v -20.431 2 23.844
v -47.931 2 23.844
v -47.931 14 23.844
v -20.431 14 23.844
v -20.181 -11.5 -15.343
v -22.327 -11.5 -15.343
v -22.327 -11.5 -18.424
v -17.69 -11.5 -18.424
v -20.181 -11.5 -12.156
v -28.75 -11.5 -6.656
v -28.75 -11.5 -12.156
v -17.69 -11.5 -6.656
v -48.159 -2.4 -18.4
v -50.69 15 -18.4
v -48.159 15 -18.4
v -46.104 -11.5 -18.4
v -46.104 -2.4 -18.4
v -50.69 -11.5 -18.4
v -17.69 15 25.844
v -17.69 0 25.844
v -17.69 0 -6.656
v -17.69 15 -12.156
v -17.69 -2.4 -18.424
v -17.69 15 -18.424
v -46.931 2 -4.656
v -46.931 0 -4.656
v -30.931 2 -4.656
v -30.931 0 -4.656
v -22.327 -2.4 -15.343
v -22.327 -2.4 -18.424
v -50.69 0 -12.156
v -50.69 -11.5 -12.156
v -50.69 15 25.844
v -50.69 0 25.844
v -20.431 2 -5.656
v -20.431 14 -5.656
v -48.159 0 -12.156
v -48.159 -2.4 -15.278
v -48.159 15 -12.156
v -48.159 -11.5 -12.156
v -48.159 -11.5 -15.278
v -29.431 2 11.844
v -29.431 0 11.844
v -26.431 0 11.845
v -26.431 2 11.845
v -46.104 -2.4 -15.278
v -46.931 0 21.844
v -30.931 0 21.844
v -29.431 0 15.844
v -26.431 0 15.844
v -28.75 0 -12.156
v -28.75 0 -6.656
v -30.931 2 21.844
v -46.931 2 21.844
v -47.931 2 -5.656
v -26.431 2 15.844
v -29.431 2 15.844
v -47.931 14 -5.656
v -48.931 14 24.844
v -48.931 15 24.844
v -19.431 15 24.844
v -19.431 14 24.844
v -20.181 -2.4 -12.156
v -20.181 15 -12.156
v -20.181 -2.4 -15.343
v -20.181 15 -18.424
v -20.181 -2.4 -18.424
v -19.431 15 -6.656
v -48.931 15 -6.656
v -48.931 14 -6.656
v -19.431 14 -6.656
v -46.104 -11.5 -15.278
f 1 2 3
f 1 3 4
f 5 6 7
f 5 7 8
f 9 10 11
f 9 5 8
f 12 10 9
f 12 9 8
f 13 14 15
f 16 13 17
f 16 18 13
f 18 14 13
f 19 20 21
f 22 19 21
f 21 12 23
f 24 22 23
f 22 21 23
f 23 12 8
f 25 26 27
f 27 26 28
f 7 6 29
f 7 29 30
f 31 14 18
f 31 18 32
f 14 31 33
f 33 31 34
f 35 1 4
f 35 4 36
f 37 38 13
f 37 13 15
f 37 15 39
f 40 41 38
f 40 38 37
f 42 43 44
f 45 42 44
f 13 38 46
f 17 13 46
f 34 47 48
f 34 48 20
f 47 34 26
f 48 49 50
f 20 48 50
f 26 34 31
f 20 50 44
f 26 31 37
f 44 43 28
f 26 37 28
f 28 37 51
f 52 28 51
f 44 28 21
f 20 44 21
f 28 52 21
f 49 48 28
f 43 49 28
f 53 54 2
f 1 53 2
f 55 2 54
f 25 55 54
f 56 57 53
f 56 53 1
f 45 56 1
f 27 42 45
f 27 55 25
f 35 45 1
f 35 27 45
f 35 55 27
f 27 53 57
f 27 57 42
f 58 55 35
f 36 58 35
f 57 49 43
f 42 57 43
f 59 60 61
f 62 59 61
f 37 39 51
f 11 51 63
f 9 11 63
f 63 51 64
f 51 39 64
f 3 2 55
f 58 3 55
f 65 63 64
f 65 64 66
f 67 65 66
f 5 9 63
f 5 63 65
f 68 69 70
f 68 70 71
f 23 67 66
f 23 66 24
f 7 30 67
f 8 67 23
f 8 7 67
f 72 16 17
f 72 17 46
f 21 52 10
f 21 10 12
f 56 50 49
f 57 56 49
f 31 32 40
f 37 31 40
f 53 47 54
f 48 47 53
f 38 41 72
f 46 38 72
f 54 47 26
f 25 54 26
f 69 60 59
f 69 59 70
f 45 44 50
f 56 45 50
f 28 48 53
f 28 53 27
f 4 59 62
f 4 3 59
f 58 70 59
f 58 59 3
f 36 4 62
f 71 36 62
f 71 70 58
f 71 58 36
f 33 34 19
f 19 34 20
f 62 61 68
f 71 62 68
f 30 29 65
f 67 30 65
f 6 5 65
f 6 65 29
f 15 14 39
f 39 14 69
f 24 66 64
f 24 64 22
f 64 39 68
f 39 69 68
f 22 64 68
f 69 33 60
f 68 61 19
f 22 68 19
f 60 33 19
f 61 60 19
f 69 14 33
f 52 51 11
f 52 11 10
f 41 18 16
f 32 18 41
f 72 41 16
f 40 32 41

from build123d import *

# Parameters (mm, degrees)
SKETCH_1_W          = 33
SKETCH_1_H          = 38
SKETCH_1_W_2        = 27.5
SKETCH_1_H_2        = 29.5
EXTRUDE_1_DEPTH     = 15
SKETCH_1_3_W        = 27.5
SKETCH_1_3_H        = 29.5
SKETCH_1_3_W_2      = 16
SKETCH_1_3_H_2      = 26.5
EXTRUDE_2_DEPTH     = 2
SKETCH_2_W          = 29.5
SKETCH_2_H          = 31.5
CUT_EXTRUDE_1_DEPTH = 1
SKETCH_3_W          = 11.060472634
SKETCH_3_H          = 5.5
EXTRUDE_3_DEPTH     = 11.5
EXTRUDE_4_DEPTH     = 9.1
SKETCH_5_W          = 2.491276019
SKETCH_5_H          = 6.268810469
EXTRUDE_5_DEPTH     = 17.4
SKETCH_6_W          = 2.530660276
SKETCH_6_H          = 6.244059343
EXTRUDE_6_DEPTH     = 26.5
SKETCH_6_3_W        = 2.054656533
SKETCH_6_3_H        = 3.122029671
EXTRUDE_7_DEPTH     = 9.1


with BuildPart() as part:
    # Sketch 1 → Extrude 1 (new body)
    with BuildSketch(Plane(origin=(0, 0, 0), x_dir=(1, 0, 0), z_dir=(0, 1, 0))):
        with Locations((-34.189708408, -6.844356319)):
            Rectangle(SKETCH_1_W, SKETCH_1_H)
        with Locations((-34.180787321, -9.094356319)):
            Rectangle(SKETCH_1_W_2, SKETCH_1_H_2, mode=Mode.SUBTRACT)
    extrude(amount=EXTRUDE_1_DEPTH)

    # Sketch 1_3 → Extrude 2 (add)
    with BuildSketch(Plane(origin=(0, 0, 0), x_dir=(1, 0, 0), z_dir=(0, 1, 0))):
        with Locations((-34.180787321, -9.094356319)):
            Rectangle(SKETCH_1_3_W, SKETCH_1_3_H)
        with Locations((-38.930787321, -8.594356319)):
            Rectangle(SKETCH_1_3_W_2, SKETCH_1_3_H_2, mode=Mode.SUBTRACT)
        Polygon((-26.430787321, -11.844851054), (-26.430787321, -15.844356319), (-29.430787321, -15.844356319), (-29.43078728, -11.844356319), align=None, mode=Mode.SUBTRACT)
    extrude(amount=EXTRUDE_2_DEPTH)

    # Sketch 2 → Cut-Extrude 1 (cut)
    with BuildSketch(Plane(origin=(0, 15, 0), x_dir=(1, 0, 0), z_dir=(0, 1, 0))):
        with Locations((-34.180787321, -9.094356319)):
            Rectangle(SKETCH_2_W, SKETCH_2_H)
    extrude(amount=-CUT_EXTRUDE_1_DEPTH, mode=Mode.SUBTRACT)

    # Sketch 3 → Extrude 3 (add)
    with BuildSketch(Plane.XZ):
        with Locations((-23.219944725, -9.405643681)):
            Rectangle(SKETCH_3_W, SKETCH_3_H)
    extrude(amount=EXTRUDE_3_DEPTH)

    # Sketch 4 → Extrude 4 (add)
    with BuildSketch(Plane.XZ.offset(11.5)):
        Polygon((-17.689708408, -12.155643681), (-20.180984427, -12.155643681), (-20.180984427, -15.342965437), (-22.327356321, -15.342965437), (-22.327356321, -18.42445415), (-20.180984427, -18.42445415), (-17.689708408, -18.42445415), align=None)
    extrude(amount=-EXTRUDE_4_DEPTH)

    # Sketch 5 → Extrude 5 (add)
    with BuildSketch(Plane(origin=(0, -2.4, 0), x_dir=(1, 0, 0), z_dir=(0, 1, 0))):
        with Locations((-18.935346417, 15.290048916)):
            Rectangle(SKETCH_5_W, SKETCH_5_H)
    extrude(amount=EXTRUDE_5_DEPTH)

    # Sketch 6 → Extrude 6 (add)
    with BuildSketch(Plane.XZ.offset(11.5)):
        with Locations((-49.42437827, -15.277673353)):
            Rectangle(SKETCH_6_W, SKETCH_6_H)
    extrude(amount=-EXTRUDE_6_DEPTH)

    # Sketch 6_3 → Extrude 7 (add)
    with BuildSketch(Plane.XZ.offset(11.5)):
        with Locations((-47.131719866, -16.838688189)):
            Rectangle(SKETCH_6_3_W, SKETCH_6_3_H)
    extrude(amount=-EXTRUDE_7_DEPTH)


solid = part.part
